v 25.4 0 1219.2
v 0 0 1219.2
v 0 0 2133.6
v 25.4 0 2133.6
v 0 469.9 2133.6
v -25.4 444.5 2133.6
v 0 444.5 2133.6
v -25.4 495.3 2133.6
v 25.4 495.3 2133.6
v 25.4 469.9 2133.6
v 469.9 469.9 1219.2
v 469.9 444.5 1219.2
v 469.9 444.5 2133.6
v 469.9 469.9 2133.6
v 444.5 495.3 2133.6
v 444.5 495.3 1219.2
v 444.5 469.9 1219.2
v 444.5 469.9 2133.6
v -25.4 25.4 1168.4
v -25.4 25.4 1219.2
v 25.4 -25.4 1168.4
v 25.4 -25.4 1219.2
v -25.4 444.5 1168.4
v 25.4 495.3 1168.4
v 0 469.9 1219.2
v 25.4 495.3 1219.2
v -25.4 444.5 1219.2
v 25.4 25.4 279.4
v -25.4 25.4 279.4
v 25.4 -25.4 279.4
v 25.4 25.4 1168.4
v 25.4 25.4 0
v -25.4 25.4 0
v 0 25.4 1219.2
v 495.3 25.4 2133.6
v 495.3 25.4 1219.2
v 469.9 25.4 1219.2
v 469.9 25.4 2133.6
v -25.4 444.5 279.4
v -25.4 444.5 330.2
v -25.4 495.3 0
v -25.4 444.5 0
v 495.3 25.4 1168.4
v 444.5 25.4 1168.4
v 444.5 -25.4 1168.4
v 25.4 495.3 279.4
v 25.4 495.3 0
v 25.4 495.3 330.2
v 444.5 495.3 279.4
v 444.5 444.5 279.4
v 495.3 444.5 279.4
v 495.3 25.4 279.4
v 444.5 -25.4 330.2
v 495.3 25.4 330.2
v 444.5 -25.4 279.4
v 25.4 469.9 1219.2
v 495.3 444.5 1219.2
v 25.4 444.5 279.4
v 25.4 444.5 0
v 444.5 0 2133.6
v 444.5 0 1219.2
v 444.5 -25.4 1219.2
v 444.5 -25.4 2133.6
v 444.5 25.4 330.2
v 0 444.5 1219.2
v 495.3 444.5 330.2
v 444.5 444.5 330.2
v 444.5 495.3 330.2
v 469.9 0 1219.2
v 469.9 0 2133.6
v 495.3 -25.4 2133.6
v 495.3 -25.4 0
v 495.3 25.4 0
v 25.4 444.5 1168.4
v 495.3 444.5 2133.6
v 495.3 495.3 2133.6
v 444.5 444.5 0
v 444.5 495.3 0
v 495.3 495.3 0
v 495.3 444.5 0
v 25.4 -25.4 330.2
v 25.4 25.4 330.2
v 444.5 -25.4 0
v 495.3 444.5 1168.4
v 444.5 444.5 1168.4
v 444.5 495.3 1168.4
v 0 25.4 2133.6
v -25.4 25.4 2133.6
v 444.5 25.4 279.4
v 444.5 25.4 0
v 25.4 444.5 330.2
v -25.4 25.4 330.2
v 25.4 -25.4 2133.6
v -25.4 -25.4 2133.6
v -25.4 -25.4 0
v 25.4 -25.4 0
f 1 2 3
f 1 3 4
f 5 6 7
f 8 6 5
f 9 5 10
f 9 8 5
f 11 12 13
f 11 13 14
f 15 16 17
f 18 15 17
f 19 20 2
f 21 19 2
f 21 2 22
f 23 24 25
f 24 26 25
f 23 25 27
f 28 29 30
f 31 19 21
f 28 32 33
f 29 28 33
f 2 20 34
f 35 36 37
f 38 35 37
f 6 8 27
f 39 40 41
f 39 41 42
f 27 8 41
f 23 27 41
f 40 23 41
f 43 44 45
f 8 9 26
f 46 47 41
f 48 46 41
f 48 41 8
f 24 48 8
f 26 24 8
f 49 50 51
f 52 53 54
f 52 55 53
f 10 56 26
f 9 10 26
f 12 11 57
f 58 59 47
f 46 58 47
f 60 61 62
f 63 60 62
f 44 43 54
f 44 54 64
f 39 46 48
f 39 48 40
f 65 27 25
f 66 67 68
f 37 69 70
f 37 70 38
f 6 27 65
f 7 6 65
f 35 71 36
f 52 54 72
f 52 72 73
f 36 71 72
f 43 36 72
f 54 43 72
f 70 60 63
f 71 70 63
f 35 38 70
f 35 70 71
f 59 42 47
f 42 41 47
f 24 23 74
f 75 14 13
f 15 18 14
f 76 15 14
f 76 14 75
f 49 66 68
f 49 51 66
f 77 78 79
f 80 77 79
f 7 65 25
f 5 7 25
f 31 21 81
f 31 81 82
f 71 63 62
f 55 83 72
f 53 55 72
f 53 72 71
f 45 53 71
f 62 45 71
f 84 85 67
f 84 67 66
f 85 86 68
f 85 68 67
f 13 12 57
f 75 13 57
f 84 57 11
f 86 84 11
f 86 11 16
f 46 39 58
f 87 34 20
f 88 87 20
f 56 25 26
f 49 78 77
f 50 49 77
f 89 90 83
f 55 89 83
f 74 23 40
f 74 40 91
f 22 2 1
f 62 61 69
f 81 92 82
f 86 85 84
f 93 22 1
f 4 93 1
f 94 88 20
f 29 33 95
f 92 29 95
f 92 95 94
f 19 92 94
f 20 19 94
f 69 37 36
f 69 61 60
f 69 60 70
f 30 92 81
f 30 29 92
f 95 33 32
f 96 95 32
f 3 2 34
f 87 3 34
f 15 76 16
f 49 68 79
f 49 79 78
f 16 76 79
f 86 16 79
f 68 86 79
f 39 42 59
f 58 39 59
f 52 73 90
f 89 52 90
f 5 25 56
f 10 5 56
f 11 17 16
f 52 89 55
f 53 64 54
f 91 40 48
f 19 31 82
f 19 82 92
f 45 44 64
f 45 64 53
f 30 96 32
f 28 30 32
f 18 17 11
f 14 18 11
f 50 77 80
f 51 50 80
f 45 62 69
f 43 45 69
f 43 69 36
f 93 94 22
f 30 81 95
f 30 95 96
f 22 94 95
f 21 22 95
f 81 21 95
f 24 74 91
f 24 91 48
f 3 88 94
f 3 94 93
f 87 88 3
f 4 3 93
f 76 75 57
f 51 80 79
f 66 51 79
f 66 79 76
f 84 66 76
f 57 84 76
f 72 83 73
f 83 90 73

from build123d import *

# Parameters (mm, degrees)
F0_W          = 25.4
F0_H          = 25.4
F1_DEPTH      = 2133.6
F4_DEPTH      = 25.4
F4_DEPTH_BACK = 25.4
F7_DEPTH      = 25.4
F7_DEPTH_BACK = 25.4
F9_W          = 25.4
F9_H          = 25.4
F10_DEPTH     = 914.4


with BuildPart() as f1:
    # F0 (on Top) → F1 (new body)
    with BuildSketch(Plane.XY):
        Polygon((25.4, 0), (0, 0), (0, 25.4), (-25.4, 25.4), (-25.4, -25.4), (25.4, -25.4), align=None)
        with Locations((12.7, 12.7)):
            Rectangle(F0_W, F0_H)
    extrude(amount=F1_DEPTH)


with BuildPart() as f1b:
    # F0 (on Top) → F1, piece 2 (new body)
    with BuildSketch(Plane.XY):
        Polygon((-25.4, 444.5), (0, 444.5), (0, 469.9), (25.4, 469.9), (25.4, 495.3), (-25.4, 495.3), align=None)
        with Locations((12.7, 457.2)):
            Rectangle(F0_W, F0_H)
    extrude(amount=F1_DEPTH)


with BuildPart() as f1c:
    # F0 (on Top) → F1, piece 3 (new body)
    with BuildSketch(Plane.XY):
        Polygon((469.9, 469.9), (469.9, 444.5), (495.3, 444.5), (495.3, 495.3), (444.5, 495.3), (444.5, 469.9), align=None)
        with Locations((457.2, 457.2)):
            Rectangle(F0_W, F0_H)
    extrude(amount=F1_DEPTH)


with BuildPart() as f1d:
    # F0 (on Top) → F1, piece 4 (new body)
    with BuildSketch(Plane.XY):
        Polygon((469.9, 0), (444.5, 0), (444.5, -25.4), (495.3, -25.4), (495.3, 25.4), (469.9, 25.4), align=None)
        with Locations((457.2, 12.7)):
            Rectangle(F0_W, F0_H)
    extrude(amount=F1_DEPTH)


with BuildPart() as f4_tool:
    # F3 (on offset) → F4 (new body, two sides)
    with BuildSketch(Plane.XY.offset(304.8)) as f4_sk:
        Polygon((457.2, 457.2), (444.5, 444.5), (469.9, 444.5), align=None)
        Polygon((444.5, 469.9), (444.5, 444.5), (457.2, 457.2), align=None)
        Polygon((12.7, 12.7), (25.4, 0), (25.4, 25.4), align=None)
        Polygon((25.4, 25.4), (0, 25.4), (12.7, 12.7), align=None)
        Polygon((444.5, 25.4), (444.5, 0), (469.9, 25.4), align=None)
        Polygon((469.9, 0), (444.5, 0), (444.5, -25.4), align=None)
        Polygon((469.9, 25.4), (444.5, 0), (469.9, 0), align=None)
        Polygon((469.9, 25.4), (469.9, 0), (495.3, 25.4), align=None)
        Polygon((25.4, 0), (0, 0), (25.4, -25.4), align=None)
        Polygon((12.7, 12.7), (0, 0), (25.4, 0), align=None)
        Polygon((0, 25.4), (0, 0), (12.7, 12.7), align=None)
        Polygon((-25.4, 25.4), (0, 0), (0, 25.4), align=None)
        Polygon((0, 469.9), (0, 444.5), (25.4, 469.9), align=None)
        Polygon((25.4, 495.3), (0, 469.9), (25.4, 469.9), align=None)
        Polygon((-25.4, 444.5), (0, 444.5), (0, 469.9), align=None)
        Polygon((25.4, 469.9), (0, 444.5), (25.4, 444.5), align=None)
        Polygon((444.5, 495.3), (444.5, 469.9), (469.9, 469.9), align=None)
        Polygon((469.9, 469.9), (469.9, 444.5), (495.3, 444.5), align=None)
        Polygon((457.2, 457.2), (469.9, 444.5), (469.9, 469.9), align=None)
        Polygon((469.9, 469.9), (444.5, 469.9), (457.2, 457.2), align=None)
    extrude(amount=-F4_DEPTH)
    extrude(f4_sk.sketch, amount=F4_DEPTH_BACK)


with BuildPart() as f1_1:
    add(f1.part)

    # F4: cut by f4_tool
    add(f4_tool.part, mode=Mode.SUBTRACT)


with BuildPart() as f1b_1:
    add(f1b.part)

    # F4: cut by f4_tool
    add(f4_tool.part, mode=Mode.SUBTRACT)


with BuildPart() as f1c_1:
    add(f1c.part)

    # F4: cut by f4_tool
    add(f4_tool.part, mode=Mode.SUBTRACT)


with BuildPart() as f1d_1:
    add(f1d.part)

    # F4: cut by f4_tool
    add(f4_tool.part, mode=Mode.SUBTRACT)


with BuildPart() as f7_tool:
    # F6 (on offset) → F7 (new body, two sides)
    with BuildSketch(Plane.XY.offset(1193.8)) as f7_sk:
        Polygon((444.5, 444.5), (469.9, 444.5), (444.5, 469.9), align=None)
        Polygon((444.5, 25.4), (444.5, 0), (469.9, 25.4), align=None)
        Polygon((0, 25.4), (25.4, 0), (25.4, 25.4), align=None)
        Polygon((-25.4, 444.5), (0, 444.5), (0, 469.9), align=None)
        Polygon((25.4, 495.3), (0, 469.9), (25.4, 469.9), align=None)
        Polygon((0, 469.9), (0, 444.5), (25.4, 469.9), align=None)
        Polygon((25.4, 469.9), (0, 444.5), (25.4, 444.5), align=None)
        Polygon((444.5, 495.3), (444.5, 469.9), (469.9, 469.9), align=None)
        Polygon((444.5, 469.9), (469.9, 444.5), (469.9, 469.9), align=None)
        Polygon((469.9, 469.9), (469.9, 444.5), (495.3, 444.5), align=None)
        Polygon((469.9, 25.4), (469.9, 0), (495.3, 25.4), align=None)
        Polygon((469.9, 25.4), (444.5, 0), (469.9, 0), align=None)
        Polygon((469.9, 0), (444.5, 0), (444.5, -25.4), align=None)
        Polygon((25.4, 0), (0, 0), (25.4, -25.4), align=None)
        Polygon((0, 25.4), (0, 0), (25.4, 0), align=None)
        Polygon((-25.4, 25.4), (0, 0), (0, 25.4), align=None)
    extrude(amount=F7_DEPTH)
    extrude(f7_sk.sketch, amount=-F7_DEPTH_BACK)


with BuildPart() as f1_2:
    add(f1_1.part)

    # F7: cut by f7_tool
    add(f7_tool.part, mode=Mode.SUBTRACT)


with BuildPart() as f1b_2:
    add(f1b_1.part)

    # F7: cut by f7_tool
    add(f7_tool.part, mode=Mode.SUBTRACT)


with BuildPart() as f1c_2:
    add(f1c_1.part)

    # F7: cut by f7_tool
    add(f7_tool.part, mode=Mode.SUBTRACT)


with BuildPart() as f1d_2:
    add(f1d_1.part)

    # F7: cut by f7_tool
    add(f7_tool.part, mode=Mode.SUBTRACT)


with BuildPart() as f10_tool:
    # F9 (on offset) → F10 (new body)
    with BuildSketch(Plane.XY.offset(1219.2)):
        with Locations((12.7, 12.7)):
            Rectangle(F9_W, F9_H)
        with Locations((12.7, 457.2)):
            Rectangle(F9_W, F9_H)
        with Locations((457.2, 457.2)):
            Rectangle(F9_W, F9_H)
        with Locations((457.2, 12.7)):
            Rectangle(F9_W, F9_H)
    extrude(amount=F10_DEPTH)


with BuildPart() as f1_3:
    add(f1_2.part)

    # F10: cut by f10_tool
    add(f10_tool.part, mode=Mode.SUBTRACT)


with BuildPart() as f1b_3:
    add(f1b_2.part)

    # F10: cut by f10_tool
    add(f10_tool.part, mode=Mode.SUBTRACT)


with BuildPart() as f1c_3:
    add(f1c_2.part)

    # F10: cut by f10_tool
    add(f10_tool.part, mode=Mode.SUBTRACT)


with BuildPart() as f1d_3:
    add(f1d_2.part)

    # F10: cut by f10_tool
    add(f10_tool.part, mode=Mode.SUBTRACT)


solid = Compound([f1_3.part, f1b_3.part, f1c_3.part, f1d_3.part])
